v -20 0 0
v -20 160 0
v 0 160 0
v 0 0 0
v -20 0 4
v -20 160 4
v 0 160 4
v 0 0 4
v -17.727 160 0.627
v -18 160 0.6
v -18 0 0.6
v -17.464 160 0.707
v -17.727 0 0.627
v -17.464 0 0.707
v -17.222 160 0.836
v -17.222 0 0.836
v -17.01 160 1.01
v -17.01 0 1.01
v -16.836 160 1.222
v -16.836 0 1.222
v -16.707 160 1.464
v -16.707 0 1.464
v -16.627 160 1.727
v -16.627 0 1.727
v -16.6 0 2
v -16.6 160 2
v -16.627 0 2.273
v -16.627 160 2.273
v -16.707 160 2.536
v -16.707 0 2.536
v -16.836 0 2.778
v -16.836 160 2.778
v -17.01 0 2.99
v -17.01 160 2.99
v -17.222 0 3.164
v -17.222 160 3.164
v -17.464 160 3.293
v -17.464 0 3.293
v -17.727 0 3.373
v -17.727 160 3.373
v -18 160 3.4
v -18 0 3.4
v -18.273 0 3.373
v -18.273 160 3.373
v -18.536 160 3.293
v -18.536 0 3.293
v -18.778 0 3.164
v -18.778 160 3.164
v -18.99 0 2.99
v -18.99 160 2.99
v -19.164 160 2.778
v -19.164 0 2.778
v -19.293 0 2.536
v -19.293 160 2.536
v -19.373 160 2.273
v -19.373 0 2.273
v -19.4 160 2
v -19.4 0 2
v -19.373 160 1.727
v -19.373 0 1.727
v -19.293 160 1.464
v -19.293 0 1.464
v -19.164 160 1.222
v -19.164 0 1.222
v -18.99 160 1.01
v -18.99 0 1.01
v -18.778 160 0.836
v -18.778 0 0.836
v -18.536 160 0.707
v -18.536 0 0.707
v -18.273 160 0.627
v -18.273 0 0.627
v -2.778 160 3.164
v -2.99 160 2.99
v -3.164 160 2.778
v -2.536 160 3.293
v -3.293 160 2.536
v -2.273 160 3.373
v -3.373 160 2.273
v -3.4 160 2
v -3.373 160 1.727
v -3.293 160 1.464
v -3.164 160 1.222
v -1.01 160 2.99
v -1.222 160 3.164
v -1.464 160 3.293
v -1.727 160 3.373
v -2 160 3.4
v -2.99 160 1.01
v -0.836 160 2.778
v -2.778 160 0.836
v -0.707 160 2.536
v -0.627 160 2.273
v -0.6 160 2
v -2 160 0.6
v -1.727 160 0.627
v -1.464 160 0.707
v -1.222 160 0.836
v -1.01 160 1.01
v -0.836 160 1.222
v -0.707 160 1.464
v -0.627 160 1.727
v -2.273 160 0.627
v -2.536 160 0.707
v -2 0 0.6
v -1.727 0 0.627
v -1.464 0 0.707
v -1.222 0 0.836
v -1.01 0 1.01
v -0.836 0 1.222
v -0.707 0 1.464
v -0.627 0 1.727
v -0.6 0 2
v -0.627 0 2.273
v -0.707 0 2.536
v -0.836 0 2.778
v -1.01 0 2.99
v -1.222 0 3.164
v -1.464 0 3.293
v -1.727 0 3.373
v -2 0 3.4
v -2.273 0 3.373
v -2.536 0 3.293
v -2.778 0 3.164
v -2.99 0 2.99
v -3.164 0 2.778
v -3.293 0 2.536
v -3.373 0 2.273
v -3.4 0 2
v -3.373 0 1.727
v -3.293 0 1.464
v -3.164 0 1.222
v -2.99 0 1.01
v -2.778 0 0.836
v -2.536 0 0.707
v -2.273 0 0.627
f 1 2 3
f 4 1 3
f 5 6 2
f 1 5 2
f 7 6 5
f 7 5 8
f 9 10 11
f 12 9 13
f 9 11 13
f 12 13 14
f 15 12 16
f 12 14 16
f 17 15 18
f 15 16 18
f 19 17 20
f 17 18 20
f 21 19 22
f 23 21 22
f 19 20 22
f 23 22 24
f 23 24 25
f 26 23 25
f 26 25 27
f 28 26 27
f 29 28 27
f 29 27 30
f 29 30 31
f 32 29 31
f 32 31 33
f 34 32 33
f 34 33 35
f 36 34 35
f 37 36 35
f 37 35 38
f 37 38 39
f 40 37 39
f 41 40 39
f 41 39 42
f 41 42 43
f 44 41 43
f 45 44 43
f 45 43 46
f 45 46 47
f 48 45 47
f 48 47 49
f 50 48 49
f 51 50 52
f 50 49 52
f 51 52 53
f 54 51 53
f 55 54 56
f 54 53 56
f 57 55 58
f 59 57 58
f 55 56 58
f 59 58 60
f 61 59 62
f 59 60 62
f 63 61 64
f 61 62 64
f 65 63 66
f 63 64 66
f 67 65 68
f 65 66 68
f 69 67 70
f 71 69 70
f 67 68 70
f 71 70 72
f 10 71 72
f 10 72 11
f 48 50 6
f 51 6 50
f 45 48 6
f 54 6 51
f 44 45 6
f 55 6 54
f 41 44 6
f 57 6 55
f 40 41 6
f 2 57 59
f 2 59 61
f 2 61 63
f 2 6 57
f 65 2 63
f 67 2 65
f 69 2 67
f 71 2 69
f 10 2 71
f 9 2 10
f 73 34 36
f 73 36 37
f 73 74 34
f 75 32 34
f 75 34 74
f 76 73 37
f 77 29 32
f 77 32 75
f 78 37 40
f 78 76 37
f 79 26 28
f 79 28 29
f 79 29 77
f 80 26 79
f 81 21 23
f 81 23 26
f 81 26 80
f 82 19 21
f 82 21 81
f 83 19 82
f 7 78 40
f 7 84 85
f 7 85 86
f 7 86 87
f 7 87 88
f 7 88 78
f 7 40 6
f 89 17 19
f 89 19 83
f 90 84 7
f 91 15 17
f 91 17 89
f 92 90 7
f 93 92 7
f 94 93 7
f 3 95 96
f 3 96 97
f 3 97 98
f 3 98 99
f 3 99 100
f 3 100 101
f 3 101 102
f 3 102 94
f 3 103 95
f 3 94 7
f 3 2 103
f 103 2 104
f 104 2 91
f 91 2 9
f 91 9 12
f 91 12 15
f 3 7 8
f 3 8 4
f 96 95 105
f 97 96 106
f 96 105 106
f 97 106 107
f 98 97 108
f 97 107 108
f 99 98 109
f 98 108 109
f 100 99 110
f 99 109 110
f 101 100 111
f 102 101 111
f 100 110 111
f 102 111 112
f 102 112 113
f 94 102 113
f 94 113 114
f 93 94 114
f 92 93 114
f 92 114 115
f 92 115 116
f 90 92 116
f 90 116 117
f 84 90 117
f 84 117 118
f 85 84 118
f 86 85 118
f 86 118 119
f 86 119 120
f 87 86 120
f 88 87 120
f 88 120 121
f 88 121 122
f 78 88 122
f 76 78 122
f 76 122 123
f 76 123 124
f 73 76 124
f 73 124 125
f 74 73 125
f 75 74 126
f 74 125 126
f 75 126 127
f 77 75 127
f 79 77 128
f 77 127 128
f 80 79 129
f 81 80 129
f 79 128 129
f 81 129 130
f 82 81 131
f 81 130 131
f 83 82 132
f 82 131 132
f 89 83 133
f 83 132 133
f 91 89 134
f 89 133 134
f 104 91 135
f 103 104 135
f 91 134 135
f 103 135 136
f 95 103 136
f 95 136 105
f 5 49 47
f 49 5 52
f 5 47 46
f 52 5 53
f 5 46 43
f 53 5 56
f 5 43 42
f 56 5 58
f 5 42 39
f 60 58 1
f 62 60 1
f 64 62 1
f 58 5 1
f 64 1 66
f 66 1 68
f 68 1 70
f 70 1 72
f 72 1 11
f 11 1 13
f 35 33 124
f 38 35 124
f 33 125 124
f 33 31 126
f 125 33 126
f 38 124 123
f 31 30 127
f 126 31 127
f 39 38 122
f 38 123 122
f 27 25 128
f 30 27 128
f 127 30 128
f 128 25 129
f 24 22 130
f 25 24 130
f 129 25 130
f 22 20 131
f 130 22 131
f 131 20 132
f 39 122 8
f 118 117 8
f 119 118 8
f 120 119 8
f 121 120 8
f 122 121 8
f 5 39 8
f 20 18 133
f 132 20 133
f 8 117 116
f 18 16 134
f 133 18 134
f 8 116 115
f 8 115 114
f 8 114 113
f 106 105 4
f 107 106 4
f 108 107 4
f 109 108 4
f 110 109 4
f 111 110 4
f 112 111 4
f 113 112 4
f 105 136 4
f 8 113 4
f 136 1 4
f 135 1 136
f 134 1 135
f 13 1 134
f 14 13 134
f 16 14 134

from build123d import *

# Parameters (mm, degrees)
SKETCH1_W           = 20
SKETCH1_H           = 4
BOSS_EXTRUDE1_DEPTH = 160
CUT_EXTRUDE1_REACH  = 163.295
SKETCH2_R           = 1.4


with BuildPart() as part:
    # Sketch1 → Boss-Extrude1 (new body)
    with BuildSketch(Plane(origin=(0, 0, 0), x_dir=(1, 0, 0), z_dir=(0, 1, 0))):
        with Locations((-10, -2)):
            Rectangle(SKETCH1_W, SKETCH1_H)
    extrude(amount=BOSS_EXTRUDE1_DEPTH)

    # Sketch2 → Cut-Extrude1 (cut, up to next)
    with BuildSketch(Plane(origin=(0, 0, 0), x_dir=(-1, 0, 0), z_dir=(0, -1, 0)), mode=Mode.PRIVATE) as cut_extrude1_sk1:
        with Locations(Location((18, -2, 0), (0, 0, 90))):
            Circle(SKETCH2_R)
    cut_extrude1_tool1 = extrude(cut_extrude1_sk1.sketch, amount=-CUT_EXTRUDE1_REACH, mode=Mode.PRIVATE) & part.part
    # Sketch2 → Cut-Extrude1 (cut, up to next)
    with BuildSketch(Plane(origin=(0, 0, 0), x_dir=(-1, 0, 0), z_dir=(0, -1, 0)), mode=Mode.PRIVATE) as cut_extrude1_sk2:
        with Locations(Location((2, -2, 0), (0, 0, 90))):
            Circle(SKETCH2_R)
    cut_extrude1_tool2 = extrude(cut_extrude1_sk2.sketch, amount=-CUT_EXTRUDE1_REACH, mode=Mode.PRIVATE) & part.part
    add(cut_extrude1_tool1.solids().sort_by_distance((-18, 0, 2))[0], mode=Mode.SUBTRACT)
    add(cut_extrude1_tool2.solids().sort_by_distance((-2, 0, 2))[0], mode=Mode.SUBTRACT)


solid = part.part
